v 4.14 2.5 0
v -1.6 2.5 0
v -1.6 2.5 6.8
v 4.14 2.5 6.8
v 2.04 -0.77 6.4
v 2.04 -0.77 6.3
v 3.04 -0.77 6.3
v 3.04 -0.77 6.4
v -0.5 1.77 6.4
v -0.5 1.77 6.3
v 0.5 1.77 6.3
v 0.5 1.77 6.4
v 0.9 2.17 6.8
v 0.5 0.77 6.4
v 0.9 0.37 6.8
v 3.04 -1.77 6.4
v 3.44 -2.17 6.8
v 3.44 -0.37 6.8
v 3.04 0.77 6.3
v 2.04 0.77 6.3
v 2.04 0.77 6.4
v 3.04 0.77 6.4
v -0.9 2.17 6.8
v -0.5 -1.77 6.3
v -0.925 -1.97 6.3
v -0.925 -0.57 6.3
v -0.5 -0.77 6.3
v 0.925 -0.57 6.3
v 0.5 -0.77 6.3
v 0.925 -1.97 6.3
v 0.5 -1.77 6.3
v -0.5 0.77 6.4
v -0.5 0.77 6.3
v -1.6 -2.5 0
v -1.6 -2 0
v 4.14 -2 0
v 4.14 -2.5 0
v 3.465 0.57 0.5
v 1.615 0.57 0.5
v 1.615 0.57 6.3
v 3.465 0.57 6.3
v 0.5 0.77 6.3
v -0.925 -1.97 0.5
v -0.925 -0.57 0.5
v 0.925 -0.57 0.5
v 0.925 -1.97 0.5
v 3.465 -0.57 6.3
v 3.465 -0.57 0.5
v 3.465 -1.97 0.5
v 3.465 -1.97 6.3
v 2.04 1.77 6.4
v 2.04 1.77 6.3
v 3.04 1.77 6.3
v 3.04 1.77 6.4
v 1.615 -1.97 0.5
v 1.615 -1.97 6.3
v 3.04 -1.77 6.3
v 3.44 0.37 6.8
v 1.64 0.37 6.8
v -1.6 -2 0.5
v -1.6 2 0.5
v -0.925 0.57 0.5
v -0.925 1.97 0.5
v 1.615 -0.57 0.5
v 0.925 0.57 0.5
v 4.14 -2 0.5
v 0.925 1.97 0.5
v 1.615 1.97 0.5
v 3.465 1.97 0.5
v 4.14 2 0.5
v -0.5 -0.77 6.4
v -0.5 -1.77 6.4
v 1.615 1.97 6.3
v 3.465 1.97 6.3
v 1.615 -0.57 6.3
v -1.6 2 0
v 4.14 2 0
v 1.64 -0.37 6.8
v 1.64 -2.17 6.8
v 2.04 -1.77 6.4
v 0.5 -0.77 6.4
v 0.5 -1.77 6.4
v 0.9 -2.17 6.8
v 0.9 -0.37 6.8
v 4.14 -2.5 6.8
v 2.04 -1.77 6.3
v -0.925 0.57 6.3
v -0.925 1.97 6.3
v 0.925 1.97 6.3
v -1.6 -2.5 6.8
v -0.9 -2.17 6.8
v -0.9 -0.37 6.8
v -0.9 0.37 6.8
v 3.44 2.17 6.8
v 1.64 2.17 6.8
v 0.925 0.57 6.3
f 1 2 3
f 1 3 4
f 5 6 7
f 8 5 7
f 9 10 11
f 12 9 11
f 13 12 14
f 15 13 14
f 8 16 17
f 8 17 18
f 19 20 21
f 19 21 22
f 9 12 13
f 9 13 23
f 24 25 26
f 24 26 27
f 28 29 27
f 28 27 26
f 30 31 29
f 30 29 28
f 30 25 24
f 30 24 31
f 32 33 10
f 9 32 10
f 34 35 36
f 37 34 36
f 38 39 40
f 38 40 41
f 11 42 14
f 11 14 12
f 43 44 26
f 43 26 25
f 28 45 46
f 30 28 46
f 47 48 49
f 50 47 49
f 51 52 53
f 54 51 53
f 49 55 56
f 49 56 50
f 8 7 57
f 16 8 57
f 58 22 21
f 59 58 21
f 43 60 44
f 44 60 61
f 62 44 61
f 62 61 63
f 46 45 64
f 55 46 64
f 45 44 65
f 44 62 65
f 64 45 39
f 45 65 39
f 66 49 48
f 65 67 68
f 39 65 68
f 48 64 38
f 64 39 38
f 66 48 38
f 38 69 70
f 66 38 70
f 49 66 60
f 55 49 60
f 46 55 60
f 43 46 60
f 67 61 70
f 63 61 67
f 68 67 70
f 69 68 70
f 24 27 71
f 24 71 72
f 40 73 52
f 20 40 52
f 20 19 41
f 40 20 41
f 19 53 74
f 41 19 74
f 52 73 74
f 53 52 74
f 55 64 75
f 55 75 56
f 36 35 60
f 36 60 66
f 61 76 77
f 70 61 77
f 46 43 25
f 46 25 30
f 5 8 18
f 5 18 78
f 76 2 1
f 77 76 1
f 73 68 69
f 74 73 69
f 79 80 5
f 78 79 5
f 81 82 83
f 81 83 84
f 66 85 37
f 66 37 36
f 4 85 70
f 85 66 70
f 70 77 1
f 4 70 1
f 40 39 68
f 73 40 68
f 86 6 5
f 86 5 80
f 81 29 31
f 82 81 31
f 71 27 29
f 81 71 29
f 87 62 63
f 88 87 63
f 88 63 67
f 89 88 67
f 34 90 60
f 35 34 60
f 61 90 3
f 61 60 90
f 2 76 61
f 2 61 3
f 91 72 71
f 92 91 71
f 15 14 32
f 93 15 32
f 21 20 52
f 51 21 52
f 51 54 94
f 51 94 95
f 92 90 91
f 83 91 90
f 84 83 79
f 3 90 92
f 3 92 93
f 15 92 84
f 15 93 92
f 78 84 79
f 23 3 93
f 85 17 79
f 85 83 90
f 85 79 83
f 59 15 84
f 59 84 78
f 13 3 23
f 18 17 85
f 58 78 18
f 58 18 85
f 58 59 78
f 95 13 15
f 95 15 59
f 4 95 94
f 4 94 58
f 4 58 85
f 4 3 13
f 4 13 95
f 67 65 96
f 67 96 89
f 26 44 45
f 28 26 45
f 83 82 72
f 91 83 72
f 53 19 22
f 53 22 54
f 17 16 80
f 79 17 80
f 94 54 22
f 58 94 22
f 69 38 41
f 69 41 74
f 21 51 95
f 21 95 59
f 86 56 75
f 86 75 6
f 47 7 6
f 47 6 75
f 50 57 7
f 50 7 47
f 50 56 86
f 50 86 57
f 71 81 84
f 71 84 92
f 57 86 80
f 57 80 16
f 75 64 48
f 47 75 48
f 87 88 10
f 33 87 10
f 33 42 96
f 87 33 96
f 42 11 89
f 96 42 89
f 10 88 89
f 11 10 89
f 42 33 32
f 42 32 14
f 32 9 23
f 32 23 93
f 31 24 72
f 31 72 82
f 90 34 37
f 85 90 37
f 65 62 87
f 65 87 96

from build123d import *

# Parameters (mm, degrees)
SKETCH006_W      = 1.85
SKETCH006_H      = 1.4
EXTRUDE006_DEPTH = 6.3
SKETCH007_W      = 1
SKETCH007_H      = 1
EXTRUDE007_DEPTH = 9
SKETCH010_W      = 4
SKETCH010_H      = 4
EXTRUDE010_DEPTH = 0.5
SKETCH011_W      = 3.2
SKETCH011_H      = 5
EXTRUDE011_DEPTH = 6.8
CHAMFER002_SIZE  = 0.4
ARRAY004_X_COUNT = 2
ARRAY004_X_PITCH = 2.54


with BuildPart() as extrude006:
    # Sketch006 → Extrude006 (new body)
    with BuildSketch(Plane.XY):
        Rectangle(SKETCH006_W, SKETCH006_H)
    extrude(amount=EXTRUDE006_DEPTH)


with BuildPart() as fusion004:
    # Sketch007 → Extrude007 (new body)
    with BuildSketch(Plane.XY):
        Rectangle(SKETCH007_W, SKETCH007_H)
    extrude(amount=EXTRUDE007_DEPTH)

    # Fusion004: union Extrude006
    add(extrude006.part)


with BuildPart() as fusion004_1:
    # Fusion004 placement: moved
    add(fusion004.part.moved(Location((0, 1.27, 0))))


with BuildPart() as extrude010:
    # Sketch010 → Extrude010 (new body)
    with BuildSketch(Plane.XY):
        Rectangle(SKETCH010_W, SKETCH010_H)
    extrude(amount=EXTRUDE010_DEPTH)


with BuildPart() as fusion005:
    # Part__Mirroring002: instance of Fusion004
    add(fusion004_1.part.mirror(Plane(origin=(0, 0, 0), x_dir=(1, 0, 0), z_dir=(0, 1, 0))))

    # Fusion005: union Fusion004, Extrude010
    add(fusion004_1.part)
    add(extrude010.part)


with BuildPart() as body002:
    # Sketch011 → Extrude011 (new body)
    with BuildSketch(Plane.XY):
        Rectangle(SKETCH011_W, SKETCH011_H)
    extrude(amount=EXTRUDE011_DEPTH)

    # Cut: cut Fusion005
    add(fusion005.part, mode=Mode.SUBTRACT)

    # Chamfer002
    chamfer002_edges = [body002.edges().sort_by_distance(p)[0] for p in [
        (0, -0.77, 6.8),
        (-0.5, -1.27, 6.8),
        (0, -1.77, 6.8),
        (0.5, -1.27, 6.8),
        (0.5, 1.27, 6.8),
        (0, 1.77, 6.8),
        (-0.5, 1.27, 6.8),
        (0, 0.77, 6.8),
    ]]
    chamfer(chamfer002_edges, length=CHAMFER002_SIZE)

    # Array004 X: body002 ×2


with BuildPart() as body002_1:
    add(body002.part)
    with Locations(*[(i * ARRAY004_X_PITCH, 0, 0) for i in range(1, ARRAY004_X_COUNT)]):
        add(body002.part)


solid = body002_1.part
